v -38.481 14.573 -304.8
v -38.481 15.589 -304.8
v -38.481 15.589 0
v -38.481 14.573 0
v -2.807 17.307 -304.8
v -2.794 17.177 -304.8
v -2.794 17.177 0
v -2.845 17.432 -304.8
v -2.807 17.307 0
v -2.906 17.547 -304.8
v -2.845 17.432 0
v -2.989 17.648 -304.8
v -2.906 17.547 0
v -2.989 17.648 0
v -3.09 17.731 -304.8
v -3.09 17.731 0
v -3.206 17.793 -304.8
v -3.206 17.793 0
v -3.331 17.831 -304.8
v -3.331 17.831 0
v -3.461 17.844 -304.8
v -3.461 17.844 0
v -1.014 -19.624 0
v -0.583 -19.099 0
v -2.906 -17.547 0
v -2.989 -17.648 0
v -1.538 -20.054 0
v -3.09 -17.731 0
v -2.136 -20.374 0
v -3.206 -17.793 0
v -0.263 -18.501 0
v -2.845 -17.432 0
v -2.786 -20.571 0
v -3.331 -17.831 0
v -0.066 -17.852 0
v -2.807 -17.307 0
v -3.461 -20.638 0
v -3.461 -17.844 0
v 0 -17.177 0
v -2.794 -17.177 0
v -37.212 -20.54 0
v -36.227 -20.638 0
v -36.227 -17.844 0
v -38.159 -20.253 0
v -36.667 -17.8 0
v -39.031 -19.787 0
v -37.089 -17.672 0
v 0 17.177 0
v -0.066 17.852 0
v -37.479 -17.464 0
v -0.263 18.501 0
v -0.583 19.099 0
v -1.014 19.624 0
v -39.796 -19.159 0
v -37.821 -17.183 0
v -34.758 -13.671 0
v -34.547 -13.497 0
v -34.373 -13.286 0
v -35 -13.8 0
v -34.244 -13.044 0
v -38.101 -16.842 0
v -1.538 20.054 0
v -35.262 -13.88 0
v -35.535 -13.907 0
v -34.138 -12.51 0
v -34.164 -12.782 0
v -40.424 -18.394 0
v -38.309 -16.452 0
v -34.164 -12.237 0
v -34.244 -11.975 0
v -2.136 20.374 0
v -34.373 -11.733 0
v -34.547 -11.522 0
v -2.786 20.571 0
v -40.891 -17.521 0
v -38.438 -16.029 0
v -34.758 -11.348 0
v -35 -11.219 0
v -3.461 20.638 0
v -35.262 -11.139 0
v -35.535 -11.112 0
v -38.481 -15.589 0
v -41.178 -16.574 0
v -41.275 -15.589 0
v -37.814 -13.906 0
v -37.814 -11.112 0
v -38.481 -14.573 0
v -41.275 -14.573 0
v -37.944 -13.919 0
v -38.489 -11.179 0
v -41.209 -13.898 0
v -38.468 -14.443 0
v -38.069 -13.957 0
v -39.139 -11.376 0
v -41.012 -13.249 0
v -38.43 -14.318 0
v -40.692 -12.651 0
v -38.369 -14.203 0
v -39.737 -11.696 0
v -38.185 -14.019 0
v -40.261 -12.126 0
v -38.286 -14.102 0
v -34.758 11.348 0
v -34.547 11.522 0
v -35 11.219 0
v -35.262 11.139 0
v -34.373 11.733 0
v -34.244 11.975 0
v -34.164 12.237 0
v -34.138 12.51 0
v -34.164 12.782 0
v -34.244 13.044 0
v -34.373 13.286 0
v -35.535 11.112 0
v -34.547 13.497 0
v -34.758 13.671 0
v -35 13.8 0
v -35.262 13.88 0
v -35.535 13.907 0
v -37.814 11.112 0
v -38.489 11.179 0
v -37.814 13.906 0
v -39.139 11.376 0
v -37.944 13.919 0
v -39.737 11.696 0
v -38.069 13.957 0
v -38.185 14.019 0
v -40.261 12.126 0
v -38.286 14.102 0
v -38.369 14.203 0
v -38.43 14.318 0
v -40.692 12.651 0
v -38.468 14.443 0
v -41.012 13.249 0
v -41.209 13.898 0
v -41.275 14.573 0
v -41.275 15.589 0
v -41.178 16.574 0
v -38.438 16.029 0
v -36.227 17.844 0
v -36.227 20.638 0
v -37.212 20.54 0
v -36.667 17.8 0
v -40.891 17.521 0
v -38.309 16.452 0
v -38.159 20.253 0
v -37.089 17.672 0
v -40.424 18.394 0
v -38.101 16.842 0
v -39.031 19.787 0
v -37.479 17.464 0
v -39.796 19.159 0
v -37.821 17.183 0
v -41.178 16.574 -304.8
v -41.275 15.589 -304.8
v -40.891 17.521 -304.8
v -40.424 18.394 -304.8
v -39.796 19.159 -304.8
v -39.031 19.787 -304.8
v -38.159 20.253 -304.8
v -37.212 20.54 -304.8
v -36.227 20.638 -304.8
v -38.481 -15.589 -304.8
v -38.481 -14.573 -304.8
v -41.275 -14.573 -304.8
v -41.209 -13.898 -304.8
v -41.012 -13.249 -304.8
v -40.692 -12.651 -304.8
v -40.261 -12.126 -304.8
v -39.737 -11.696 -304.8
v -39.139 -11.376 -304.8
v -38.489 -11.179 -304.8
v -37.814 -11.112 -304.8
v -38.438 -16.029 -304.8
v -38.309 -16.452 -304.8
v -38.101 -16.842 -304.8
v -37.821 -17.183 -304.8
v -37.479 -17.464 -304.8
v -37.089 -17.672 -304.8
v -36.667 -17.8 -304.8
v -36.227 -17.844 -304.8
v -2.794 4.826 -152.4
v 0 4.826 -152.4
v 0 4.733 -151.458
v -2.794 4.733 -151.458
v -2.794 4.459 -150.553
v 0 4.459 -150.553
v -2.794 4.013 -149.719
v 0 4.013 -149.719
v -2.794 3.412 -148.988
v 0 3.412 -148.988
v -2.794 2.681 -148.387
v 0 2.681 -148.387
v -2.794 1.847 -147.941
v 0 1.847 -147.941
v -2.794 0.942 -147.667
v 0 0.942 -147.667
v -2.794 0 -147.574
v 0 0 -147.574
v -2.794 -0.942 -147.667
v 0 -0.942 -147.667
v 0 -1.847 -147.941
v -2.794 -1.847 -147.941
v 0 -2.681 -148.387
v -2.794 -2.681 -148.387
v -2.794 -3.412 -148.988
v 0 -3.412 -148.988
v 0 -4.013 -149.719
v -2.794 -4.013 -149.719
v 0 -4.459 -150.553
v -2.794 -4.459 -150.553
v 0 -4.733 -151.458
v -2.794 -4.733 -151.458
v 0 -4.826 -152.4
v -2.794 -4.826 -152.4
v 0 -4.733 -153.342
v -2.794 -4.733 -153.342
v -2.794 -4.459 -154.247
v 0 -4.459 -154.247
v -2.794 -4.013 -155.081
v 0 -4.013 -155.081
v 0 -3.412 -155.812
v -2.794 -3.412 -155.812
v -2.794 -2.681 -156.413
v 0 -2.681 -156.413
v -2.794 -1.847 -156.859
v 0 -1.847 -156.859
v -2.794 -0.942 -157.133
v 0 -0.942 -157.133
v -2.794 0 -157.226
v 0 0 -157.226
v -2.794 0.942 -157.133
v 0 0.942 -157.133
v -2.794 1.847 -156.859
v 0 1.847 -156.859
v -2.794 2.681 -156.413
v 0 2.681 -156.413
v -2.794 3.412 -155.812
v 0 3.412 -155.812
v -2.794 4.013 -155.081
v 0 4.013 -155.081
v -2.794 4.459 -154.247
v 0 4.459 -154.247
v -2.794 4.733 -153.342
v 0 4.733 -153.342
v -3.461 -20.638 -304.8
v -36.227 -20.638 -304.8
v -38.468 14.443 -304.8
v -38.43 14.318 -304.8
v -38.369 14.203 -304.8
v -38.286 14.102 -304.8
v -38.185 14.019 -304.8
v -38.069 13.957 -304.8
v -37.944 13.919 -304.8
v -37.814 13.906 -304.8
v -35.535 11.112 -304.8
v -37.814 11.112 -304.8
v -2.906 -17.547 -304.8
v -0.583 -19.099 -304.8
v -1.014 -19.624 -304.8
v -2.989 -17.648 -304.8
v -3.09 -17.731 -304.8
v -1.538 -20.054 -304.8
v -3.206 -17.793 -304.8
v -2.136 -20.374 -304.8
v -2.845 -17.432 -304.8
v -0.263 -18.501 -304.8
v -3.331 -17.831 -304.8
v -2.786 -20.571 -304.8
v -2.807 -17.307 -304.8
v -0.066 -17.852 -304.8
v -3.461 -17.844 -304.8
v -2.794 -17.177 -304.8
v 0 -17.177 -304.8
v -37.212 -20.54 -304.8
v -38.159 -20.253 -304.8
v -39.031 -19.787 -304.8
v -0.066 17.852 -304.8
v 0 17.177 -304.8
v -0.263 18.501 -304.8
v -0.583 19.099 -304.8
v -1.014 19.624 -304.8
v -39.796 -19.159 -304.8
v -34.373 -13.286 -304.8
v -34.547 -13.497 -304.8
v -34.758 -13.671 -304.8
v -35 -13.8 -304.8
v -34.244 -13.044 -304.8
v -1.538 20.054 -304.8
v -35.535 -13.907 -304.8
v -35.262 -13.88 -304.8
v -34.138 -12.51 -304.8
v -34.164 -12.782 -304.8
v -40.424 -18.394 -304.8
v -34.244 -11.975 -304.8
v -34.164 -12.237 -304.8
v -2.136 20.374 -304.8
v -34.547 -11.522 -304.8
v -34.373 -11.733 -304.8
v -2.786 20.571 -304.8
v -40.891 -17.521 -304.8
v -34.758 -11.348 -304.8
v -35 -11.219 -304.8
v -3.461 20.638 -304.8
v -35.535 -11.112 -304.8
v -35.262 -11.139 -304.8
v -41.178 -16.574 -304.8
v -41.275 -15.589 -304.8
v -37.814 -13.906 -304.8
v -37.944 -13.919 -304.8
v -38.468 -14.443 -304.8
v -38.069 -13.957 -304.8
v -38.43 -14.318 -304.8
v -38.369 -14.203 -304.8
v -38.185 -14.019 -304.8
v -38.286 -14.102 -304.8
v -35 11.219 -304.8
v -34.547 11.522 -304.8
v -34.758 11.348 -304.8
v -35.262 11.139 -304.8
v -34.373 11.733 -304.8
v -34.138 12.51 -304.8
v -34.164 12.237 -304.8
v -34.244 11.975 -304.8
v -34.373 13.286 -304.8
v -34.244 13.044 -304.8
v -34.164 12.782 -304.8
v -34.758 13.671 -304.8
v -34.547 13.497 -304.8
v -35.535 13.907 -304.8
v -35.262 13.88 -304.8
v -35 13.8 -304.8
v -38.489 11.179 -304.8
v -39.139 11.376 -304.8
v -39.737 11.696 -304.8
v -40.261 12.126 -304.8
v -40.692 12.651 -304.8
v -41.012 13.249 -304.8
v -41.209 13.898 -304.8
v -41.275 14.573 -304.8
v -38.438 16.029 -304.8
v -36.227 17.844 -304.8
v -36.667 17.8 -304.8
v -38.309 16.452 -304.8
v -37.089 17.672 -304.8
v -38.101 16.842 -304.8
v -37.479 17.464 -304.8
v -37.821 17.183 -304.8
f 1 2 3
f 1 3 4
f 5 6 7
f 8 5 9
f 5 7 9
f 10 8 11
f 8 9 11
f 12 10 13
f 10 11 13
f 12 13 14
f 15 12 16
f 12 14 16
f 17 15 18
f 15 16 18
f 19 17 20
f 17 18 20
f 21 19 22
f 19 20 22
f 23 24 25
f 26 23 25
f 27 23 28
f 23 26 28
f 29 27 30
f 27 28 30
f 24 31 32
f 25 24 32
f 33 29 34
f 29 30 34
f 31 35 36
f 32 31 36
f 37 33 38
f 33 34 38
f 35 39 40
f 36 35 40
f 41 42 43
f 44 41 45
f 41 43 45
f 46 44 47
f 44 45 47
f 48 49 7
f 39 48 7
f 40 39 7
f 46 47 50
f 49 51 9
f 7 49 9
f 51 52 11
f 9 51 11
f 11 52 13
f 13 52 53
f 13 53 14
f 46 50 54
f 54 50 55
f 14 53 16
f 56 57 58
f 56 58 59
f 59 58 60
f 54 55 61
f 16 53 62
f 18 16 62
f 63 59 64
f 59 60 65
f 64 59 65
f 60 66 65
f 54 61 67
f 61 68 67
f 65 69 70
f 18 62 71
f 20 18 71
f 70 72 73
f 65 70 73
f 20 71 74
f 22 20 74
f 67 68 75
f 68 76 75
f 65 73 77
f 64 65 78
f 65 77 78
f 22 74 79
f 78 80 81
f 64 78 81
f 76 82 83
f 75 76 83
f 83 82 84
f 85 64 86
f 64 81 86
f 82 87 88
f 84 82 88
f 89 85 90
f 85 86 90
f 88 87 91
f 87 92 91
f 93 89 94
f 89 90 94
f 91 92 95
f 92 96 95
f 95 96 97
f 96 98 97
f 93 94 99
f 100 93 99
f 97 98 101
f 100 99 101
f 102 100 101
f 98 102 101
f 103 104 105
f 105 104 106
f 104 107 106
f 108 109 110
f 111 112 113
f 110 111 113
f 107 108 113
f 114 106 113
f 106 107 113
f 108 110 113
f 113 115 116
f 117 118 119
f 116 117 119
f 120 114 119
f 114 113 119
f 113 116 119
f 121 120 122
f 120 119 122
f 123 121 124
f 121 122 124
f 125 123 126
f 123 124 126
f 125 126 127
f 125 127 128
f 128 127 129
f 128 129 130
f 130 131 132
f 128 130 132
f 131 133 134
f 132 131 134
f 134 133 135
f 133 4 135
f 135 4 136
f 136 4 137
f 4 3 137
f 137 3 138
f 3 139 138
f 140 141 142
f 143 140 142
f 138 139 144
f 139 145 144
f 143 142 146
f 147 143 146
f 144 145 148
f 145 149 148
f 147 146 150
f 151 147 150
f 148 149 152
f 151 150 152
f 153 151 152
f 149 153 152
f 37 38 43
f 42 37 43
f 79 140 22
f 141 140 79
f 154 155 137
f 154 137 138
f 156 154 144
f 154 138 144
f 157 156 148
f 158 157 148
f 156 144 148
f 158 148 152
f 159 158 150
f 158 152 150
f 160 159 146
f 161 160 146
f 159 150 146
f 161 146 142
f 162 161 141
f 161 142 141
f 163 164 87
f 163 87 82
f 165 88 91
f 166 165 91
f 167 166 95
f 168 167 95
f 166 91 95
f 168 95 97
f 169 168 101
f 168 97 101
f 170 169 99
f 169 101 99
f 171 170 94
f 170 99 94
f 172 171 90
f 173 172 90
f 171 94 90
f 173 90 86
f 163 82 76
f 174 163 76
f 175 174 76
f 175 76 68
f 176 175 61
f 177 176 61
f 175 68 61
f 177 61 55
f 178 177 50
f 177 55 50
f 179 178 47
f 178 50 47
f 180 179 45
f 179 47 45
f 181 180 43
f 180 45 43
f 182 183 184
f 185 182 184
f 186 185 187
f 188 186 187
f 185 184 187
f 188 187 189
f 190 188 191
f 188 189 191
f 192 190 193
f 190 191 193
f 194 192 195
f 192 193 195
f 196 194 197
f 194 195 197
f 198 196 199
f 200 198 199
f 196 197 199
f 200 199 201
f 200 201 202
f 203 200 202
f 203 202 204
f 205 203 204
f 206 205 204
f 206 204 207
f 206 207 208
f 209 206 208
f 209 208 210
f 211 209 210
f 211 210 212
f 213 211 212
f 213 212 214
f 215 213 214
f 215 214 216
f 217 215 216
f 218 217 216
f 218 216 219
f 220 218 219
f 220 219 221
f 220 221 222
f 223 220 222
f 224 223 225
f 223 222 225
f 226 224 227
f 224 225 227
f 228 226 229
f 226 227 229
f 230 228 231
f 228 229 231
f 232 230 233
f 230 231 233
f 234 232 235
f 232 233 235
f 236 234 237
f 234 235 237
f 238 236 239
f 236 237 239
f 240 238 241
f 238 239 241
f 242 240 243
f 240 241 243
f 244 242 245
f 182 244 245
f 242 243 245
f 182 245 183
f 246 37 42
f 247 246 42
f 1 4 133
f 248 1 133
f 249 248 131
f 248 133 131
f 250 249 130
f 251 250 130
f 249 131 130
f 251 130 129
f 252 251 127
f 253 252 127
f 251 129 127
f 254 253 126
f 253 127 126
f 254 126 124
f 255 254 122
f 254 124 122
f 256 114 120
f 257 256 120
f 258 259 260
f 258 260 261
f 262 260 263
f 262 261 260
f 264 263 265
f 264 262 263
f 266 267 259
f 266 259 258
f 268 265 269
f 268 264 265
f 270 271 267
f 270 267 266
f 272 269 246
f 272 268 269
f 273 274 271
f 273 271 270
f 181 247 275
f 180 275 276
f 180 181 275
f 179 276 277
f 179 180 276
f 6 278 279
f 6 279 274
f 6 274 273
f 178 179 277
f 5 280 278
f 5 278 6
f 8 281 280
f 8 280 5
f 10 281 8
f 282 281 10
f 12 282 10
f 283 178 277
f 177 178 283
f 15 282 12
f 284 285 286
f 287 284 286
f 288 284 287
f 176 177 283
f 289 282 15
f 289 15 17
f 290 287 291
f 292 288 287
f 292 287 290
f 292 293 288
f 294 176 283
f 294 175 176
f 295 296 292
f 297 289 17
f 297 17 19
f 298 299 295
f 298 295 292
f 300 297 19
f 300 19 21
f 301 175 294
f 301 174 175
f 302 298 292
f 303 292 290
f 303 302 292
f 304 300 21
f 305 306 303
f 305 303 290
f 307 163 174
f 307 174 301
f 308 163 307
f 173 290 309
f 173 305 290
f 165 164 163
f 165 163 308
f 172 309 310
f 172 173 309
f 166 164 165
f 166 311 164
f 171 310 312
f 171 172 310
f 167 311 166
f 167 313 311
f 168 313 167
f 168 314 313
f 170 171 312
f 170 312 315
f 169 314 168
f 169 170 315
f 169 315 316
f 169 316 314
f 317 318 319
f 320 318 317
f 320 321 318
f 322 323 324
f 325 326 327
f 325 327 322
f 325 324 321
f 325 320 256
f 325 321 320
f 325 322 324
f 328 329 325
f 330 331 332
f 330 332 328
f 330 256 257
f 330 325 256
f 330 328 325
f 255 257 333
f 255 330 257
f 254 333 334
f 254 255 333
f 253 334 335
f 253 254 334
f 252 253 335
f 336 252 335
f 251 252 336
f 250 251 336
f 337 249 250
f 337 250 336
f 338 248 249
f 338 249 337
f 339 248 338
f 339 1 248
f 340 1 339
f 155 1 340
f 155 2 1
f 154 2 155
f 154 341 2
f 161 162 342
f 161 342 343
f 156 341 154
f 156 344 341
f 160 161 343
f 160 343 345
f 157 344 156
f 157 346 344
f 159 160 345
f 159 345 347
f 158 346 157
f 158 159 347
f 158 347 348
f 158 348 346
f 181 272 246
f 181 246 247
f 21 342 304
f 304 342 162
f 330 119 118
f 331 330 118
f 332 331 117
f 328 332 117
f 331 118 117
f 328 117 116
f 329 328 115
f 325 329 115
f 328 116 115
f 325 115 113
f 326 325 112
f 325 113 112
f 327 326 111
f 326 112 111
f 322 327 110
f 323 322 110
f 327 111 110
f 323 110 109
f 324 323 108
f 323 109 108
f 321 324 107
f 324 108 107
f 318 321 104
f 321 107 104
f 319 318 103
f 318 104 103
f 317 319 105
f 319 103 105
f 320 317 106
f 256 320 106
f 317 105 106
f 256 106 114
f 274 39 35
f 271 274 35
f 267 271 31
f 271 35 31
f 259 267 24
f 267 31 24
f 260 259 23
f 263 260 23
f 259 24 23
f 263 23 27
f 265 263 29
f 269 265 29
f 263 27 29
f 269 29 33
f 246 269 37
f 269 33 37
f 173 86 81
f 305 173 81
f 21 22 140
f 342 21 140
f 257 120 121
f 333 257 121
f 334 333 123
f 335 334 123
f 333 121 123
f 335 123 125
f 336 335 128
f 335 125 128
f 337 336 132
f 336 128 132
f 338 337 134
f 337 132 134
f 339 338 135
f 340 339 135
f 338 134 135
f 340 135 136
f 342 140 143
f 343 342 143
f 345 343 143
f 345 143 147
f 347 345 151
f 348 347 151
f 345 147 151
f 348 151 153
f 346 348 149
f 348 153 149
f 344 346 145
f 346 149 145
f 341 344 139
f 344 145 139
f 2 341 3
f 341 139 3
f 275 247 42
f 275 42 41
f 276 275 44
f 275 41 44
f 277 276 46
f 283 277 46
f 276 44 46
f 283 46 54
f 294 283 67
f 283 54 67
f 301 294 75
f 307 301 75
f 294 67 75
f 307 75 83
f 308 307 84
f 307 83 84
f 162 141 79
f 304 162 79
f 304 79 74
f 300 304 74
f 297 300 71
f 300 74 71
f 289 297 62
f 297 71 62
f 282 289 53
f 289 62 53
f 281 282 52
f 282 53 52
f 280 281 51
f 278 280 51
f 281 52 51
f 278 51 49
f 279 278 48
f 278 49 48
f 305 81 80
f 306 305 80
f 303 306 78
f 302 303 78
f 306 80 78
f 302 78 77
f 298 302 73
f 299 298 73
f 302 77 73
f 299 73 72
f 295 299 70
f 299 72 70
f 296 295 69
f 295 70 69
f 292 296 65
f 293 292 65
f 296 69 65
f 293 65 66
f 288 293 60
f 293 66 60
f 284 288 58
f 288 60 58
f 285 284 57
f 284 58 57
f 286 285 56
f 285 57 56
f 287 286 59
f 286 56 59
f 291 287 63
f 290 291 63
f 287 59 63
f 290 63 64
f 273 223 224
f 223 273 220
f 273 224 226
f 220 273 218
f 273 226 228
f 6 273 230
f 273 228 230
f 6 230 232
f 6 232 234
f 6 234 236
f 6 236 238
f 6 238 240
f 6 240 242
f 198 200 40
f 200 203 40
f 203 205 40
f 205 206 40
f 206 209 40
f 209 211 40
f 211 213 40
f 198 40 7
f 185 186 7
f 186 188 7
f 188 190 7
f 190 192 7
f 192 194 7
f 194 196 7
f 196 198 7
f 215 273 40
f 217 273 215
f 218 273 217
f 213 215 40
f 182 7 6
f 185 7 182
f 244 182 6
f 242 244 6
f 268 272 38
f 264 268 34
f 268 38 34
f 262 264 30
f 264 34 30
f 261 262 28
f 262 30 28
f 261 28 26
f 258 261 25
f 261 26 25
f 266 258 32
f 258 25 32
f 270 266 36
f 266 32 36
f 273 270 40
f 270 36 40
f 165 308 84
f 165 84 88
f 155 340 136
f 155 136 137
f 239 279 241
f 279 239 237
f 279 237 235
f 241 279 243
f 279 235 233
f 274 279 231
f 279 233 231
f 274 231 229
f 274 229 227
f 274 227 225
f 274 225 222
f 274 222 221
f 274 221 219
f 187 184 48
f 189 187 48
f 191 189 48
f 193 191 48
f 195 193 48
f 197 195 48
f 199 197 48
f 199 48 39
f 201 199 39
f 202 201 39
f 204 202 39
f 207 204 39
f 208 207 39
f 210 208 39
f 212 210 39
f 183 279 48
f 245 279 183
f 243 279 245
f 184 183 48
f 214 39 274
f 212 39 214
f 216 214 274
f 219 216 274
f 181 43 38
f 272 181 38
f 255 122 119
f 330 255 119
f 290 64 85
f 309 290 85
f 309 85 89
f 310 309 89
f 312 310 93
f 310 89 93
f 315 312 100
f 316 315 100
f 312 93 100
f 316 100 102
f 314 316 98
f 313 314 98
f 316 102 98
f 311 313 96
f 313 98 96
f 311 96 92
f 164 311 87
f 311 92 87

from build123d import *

# Parameters (mm, degrees)
BOSS_EXTRUDE1_DEPTH = 304.8
SKETCH4_R           = 4.826
CUT_EXTRUDE1_DEPTH  = 309.273534432


with BuildPart() as part:
    # Sketch1 → Boss-Extrude1 (new body)
    with BuildSketch(Plane.XY):
        with BuildLine():
            Line((-36.22675, 20.6375), (-3.46075, 20.6375))
            ThreePointArc((-3.46075, 20.6375), (-1.013630207, 19.623869793), (0, 17.17675))
            Line((0, 17.17675), (0, -17.17675))
            ThreePointArc((0, -17.17675), (-1.013630207, -19.623869793), (-3.46075, -20.6375))
            Line((-3.46075, -20.6375), (-36.22675, -20.6375))
            ThreePointArc((-36.22675, -20.6375), (-39.796401808, -19.158901808), (-41.275, -15.58925))
            Line((-41.275, -15.58925), (-41.275, -14.57325))
            ThreePointArc((-41.275, -14.57325), (-40.261369793, -12.126130207), (-37.81425, -11.1125))
            Line((-37.81425, -11.1125), (-35.5346, -11.1125))
            ThreePointArc((-35.5346, -11.1125), (-34.1376, -12.5095), (-35.5346, -13.9065))
            Line((-35.5346, -13.9065), (-37.81425, -13.9065))
            ThreePointArc((-37.81425, -13.9065), (-38.285713446, -14.101786554), (-38.481, -14.57325))
            Line((-38.481, -14.57325), (-38.481, -15.58925))
            ThreePointArc((-38.481, -15.58925), (-37.820745461, -17.183245461), (-36.22675, -17.8435))
            Line((-36.22675, -17.8435), (-3.46075, -17.8435))
            ThreePointArc((-3.46075, -17.8435), (-2.989286554, -17.648213446), (-2.794, -17.17675))
            Line((-2.794, -17.17675), (-2.794, 17.17675))
            ThreePointArc((-2.794, 17.17675), (-2.989286554, 17.648213446), (-3.46075, 17.8435))
            Line((-3.46075, 17.8435), (-36.22675, 17.8435))
            ThreePointArc((-36.22675, 17.8435), (-37.820745461, 17.183245461), (-38.481, 15.58925))
            Line((-38.481, 15.58925), (-38.481, 14.57325))
            ThreePointArc((-38.481, 14.57325), (-38.285713446, 14.101786554), (-37.81425, 13.9065))
            Line((-37.81425, 13.9065), (-35.5346, 13.9065))
            ThreePointArc((-35.5346, 13.9065), (-34.1376, 12.5095), (-35.5346, 11.1125))
            Line((-35.5346, 11.1125), (-37.81425, 11.1125))
            ThreePointArc((-37.81425, 11.1125), (-40.261369793, 12.126130207), (-41.275, 14.57325))
            Line((-41.275, 14.57325), (-41.275, 15.58925))
            ThreePointArc((-41.275, 15.58925), (-39.796401808, 19.158901808), (-36.22675, 20.6375))
        make_face()
    extrude(amount=-BOSS_EXTRUDE1_DEPTH)

    # Sketch4 → Cut-Extrude1 (cut, through all)
    with BuildSketch(Plane(origin=(0, 0, 0), x_dir=(0, 0, -1), z_dir=(1, 0, 0))):
        with Locations(Location((152.4, 0, 0), (0, 0, 90))):
            Circle(SKETCH4_R)
    extrude(amount=-CUT_EXTRUDE1_DEPTH, mode=Mode.SUBTRACT)


solid = part.part
